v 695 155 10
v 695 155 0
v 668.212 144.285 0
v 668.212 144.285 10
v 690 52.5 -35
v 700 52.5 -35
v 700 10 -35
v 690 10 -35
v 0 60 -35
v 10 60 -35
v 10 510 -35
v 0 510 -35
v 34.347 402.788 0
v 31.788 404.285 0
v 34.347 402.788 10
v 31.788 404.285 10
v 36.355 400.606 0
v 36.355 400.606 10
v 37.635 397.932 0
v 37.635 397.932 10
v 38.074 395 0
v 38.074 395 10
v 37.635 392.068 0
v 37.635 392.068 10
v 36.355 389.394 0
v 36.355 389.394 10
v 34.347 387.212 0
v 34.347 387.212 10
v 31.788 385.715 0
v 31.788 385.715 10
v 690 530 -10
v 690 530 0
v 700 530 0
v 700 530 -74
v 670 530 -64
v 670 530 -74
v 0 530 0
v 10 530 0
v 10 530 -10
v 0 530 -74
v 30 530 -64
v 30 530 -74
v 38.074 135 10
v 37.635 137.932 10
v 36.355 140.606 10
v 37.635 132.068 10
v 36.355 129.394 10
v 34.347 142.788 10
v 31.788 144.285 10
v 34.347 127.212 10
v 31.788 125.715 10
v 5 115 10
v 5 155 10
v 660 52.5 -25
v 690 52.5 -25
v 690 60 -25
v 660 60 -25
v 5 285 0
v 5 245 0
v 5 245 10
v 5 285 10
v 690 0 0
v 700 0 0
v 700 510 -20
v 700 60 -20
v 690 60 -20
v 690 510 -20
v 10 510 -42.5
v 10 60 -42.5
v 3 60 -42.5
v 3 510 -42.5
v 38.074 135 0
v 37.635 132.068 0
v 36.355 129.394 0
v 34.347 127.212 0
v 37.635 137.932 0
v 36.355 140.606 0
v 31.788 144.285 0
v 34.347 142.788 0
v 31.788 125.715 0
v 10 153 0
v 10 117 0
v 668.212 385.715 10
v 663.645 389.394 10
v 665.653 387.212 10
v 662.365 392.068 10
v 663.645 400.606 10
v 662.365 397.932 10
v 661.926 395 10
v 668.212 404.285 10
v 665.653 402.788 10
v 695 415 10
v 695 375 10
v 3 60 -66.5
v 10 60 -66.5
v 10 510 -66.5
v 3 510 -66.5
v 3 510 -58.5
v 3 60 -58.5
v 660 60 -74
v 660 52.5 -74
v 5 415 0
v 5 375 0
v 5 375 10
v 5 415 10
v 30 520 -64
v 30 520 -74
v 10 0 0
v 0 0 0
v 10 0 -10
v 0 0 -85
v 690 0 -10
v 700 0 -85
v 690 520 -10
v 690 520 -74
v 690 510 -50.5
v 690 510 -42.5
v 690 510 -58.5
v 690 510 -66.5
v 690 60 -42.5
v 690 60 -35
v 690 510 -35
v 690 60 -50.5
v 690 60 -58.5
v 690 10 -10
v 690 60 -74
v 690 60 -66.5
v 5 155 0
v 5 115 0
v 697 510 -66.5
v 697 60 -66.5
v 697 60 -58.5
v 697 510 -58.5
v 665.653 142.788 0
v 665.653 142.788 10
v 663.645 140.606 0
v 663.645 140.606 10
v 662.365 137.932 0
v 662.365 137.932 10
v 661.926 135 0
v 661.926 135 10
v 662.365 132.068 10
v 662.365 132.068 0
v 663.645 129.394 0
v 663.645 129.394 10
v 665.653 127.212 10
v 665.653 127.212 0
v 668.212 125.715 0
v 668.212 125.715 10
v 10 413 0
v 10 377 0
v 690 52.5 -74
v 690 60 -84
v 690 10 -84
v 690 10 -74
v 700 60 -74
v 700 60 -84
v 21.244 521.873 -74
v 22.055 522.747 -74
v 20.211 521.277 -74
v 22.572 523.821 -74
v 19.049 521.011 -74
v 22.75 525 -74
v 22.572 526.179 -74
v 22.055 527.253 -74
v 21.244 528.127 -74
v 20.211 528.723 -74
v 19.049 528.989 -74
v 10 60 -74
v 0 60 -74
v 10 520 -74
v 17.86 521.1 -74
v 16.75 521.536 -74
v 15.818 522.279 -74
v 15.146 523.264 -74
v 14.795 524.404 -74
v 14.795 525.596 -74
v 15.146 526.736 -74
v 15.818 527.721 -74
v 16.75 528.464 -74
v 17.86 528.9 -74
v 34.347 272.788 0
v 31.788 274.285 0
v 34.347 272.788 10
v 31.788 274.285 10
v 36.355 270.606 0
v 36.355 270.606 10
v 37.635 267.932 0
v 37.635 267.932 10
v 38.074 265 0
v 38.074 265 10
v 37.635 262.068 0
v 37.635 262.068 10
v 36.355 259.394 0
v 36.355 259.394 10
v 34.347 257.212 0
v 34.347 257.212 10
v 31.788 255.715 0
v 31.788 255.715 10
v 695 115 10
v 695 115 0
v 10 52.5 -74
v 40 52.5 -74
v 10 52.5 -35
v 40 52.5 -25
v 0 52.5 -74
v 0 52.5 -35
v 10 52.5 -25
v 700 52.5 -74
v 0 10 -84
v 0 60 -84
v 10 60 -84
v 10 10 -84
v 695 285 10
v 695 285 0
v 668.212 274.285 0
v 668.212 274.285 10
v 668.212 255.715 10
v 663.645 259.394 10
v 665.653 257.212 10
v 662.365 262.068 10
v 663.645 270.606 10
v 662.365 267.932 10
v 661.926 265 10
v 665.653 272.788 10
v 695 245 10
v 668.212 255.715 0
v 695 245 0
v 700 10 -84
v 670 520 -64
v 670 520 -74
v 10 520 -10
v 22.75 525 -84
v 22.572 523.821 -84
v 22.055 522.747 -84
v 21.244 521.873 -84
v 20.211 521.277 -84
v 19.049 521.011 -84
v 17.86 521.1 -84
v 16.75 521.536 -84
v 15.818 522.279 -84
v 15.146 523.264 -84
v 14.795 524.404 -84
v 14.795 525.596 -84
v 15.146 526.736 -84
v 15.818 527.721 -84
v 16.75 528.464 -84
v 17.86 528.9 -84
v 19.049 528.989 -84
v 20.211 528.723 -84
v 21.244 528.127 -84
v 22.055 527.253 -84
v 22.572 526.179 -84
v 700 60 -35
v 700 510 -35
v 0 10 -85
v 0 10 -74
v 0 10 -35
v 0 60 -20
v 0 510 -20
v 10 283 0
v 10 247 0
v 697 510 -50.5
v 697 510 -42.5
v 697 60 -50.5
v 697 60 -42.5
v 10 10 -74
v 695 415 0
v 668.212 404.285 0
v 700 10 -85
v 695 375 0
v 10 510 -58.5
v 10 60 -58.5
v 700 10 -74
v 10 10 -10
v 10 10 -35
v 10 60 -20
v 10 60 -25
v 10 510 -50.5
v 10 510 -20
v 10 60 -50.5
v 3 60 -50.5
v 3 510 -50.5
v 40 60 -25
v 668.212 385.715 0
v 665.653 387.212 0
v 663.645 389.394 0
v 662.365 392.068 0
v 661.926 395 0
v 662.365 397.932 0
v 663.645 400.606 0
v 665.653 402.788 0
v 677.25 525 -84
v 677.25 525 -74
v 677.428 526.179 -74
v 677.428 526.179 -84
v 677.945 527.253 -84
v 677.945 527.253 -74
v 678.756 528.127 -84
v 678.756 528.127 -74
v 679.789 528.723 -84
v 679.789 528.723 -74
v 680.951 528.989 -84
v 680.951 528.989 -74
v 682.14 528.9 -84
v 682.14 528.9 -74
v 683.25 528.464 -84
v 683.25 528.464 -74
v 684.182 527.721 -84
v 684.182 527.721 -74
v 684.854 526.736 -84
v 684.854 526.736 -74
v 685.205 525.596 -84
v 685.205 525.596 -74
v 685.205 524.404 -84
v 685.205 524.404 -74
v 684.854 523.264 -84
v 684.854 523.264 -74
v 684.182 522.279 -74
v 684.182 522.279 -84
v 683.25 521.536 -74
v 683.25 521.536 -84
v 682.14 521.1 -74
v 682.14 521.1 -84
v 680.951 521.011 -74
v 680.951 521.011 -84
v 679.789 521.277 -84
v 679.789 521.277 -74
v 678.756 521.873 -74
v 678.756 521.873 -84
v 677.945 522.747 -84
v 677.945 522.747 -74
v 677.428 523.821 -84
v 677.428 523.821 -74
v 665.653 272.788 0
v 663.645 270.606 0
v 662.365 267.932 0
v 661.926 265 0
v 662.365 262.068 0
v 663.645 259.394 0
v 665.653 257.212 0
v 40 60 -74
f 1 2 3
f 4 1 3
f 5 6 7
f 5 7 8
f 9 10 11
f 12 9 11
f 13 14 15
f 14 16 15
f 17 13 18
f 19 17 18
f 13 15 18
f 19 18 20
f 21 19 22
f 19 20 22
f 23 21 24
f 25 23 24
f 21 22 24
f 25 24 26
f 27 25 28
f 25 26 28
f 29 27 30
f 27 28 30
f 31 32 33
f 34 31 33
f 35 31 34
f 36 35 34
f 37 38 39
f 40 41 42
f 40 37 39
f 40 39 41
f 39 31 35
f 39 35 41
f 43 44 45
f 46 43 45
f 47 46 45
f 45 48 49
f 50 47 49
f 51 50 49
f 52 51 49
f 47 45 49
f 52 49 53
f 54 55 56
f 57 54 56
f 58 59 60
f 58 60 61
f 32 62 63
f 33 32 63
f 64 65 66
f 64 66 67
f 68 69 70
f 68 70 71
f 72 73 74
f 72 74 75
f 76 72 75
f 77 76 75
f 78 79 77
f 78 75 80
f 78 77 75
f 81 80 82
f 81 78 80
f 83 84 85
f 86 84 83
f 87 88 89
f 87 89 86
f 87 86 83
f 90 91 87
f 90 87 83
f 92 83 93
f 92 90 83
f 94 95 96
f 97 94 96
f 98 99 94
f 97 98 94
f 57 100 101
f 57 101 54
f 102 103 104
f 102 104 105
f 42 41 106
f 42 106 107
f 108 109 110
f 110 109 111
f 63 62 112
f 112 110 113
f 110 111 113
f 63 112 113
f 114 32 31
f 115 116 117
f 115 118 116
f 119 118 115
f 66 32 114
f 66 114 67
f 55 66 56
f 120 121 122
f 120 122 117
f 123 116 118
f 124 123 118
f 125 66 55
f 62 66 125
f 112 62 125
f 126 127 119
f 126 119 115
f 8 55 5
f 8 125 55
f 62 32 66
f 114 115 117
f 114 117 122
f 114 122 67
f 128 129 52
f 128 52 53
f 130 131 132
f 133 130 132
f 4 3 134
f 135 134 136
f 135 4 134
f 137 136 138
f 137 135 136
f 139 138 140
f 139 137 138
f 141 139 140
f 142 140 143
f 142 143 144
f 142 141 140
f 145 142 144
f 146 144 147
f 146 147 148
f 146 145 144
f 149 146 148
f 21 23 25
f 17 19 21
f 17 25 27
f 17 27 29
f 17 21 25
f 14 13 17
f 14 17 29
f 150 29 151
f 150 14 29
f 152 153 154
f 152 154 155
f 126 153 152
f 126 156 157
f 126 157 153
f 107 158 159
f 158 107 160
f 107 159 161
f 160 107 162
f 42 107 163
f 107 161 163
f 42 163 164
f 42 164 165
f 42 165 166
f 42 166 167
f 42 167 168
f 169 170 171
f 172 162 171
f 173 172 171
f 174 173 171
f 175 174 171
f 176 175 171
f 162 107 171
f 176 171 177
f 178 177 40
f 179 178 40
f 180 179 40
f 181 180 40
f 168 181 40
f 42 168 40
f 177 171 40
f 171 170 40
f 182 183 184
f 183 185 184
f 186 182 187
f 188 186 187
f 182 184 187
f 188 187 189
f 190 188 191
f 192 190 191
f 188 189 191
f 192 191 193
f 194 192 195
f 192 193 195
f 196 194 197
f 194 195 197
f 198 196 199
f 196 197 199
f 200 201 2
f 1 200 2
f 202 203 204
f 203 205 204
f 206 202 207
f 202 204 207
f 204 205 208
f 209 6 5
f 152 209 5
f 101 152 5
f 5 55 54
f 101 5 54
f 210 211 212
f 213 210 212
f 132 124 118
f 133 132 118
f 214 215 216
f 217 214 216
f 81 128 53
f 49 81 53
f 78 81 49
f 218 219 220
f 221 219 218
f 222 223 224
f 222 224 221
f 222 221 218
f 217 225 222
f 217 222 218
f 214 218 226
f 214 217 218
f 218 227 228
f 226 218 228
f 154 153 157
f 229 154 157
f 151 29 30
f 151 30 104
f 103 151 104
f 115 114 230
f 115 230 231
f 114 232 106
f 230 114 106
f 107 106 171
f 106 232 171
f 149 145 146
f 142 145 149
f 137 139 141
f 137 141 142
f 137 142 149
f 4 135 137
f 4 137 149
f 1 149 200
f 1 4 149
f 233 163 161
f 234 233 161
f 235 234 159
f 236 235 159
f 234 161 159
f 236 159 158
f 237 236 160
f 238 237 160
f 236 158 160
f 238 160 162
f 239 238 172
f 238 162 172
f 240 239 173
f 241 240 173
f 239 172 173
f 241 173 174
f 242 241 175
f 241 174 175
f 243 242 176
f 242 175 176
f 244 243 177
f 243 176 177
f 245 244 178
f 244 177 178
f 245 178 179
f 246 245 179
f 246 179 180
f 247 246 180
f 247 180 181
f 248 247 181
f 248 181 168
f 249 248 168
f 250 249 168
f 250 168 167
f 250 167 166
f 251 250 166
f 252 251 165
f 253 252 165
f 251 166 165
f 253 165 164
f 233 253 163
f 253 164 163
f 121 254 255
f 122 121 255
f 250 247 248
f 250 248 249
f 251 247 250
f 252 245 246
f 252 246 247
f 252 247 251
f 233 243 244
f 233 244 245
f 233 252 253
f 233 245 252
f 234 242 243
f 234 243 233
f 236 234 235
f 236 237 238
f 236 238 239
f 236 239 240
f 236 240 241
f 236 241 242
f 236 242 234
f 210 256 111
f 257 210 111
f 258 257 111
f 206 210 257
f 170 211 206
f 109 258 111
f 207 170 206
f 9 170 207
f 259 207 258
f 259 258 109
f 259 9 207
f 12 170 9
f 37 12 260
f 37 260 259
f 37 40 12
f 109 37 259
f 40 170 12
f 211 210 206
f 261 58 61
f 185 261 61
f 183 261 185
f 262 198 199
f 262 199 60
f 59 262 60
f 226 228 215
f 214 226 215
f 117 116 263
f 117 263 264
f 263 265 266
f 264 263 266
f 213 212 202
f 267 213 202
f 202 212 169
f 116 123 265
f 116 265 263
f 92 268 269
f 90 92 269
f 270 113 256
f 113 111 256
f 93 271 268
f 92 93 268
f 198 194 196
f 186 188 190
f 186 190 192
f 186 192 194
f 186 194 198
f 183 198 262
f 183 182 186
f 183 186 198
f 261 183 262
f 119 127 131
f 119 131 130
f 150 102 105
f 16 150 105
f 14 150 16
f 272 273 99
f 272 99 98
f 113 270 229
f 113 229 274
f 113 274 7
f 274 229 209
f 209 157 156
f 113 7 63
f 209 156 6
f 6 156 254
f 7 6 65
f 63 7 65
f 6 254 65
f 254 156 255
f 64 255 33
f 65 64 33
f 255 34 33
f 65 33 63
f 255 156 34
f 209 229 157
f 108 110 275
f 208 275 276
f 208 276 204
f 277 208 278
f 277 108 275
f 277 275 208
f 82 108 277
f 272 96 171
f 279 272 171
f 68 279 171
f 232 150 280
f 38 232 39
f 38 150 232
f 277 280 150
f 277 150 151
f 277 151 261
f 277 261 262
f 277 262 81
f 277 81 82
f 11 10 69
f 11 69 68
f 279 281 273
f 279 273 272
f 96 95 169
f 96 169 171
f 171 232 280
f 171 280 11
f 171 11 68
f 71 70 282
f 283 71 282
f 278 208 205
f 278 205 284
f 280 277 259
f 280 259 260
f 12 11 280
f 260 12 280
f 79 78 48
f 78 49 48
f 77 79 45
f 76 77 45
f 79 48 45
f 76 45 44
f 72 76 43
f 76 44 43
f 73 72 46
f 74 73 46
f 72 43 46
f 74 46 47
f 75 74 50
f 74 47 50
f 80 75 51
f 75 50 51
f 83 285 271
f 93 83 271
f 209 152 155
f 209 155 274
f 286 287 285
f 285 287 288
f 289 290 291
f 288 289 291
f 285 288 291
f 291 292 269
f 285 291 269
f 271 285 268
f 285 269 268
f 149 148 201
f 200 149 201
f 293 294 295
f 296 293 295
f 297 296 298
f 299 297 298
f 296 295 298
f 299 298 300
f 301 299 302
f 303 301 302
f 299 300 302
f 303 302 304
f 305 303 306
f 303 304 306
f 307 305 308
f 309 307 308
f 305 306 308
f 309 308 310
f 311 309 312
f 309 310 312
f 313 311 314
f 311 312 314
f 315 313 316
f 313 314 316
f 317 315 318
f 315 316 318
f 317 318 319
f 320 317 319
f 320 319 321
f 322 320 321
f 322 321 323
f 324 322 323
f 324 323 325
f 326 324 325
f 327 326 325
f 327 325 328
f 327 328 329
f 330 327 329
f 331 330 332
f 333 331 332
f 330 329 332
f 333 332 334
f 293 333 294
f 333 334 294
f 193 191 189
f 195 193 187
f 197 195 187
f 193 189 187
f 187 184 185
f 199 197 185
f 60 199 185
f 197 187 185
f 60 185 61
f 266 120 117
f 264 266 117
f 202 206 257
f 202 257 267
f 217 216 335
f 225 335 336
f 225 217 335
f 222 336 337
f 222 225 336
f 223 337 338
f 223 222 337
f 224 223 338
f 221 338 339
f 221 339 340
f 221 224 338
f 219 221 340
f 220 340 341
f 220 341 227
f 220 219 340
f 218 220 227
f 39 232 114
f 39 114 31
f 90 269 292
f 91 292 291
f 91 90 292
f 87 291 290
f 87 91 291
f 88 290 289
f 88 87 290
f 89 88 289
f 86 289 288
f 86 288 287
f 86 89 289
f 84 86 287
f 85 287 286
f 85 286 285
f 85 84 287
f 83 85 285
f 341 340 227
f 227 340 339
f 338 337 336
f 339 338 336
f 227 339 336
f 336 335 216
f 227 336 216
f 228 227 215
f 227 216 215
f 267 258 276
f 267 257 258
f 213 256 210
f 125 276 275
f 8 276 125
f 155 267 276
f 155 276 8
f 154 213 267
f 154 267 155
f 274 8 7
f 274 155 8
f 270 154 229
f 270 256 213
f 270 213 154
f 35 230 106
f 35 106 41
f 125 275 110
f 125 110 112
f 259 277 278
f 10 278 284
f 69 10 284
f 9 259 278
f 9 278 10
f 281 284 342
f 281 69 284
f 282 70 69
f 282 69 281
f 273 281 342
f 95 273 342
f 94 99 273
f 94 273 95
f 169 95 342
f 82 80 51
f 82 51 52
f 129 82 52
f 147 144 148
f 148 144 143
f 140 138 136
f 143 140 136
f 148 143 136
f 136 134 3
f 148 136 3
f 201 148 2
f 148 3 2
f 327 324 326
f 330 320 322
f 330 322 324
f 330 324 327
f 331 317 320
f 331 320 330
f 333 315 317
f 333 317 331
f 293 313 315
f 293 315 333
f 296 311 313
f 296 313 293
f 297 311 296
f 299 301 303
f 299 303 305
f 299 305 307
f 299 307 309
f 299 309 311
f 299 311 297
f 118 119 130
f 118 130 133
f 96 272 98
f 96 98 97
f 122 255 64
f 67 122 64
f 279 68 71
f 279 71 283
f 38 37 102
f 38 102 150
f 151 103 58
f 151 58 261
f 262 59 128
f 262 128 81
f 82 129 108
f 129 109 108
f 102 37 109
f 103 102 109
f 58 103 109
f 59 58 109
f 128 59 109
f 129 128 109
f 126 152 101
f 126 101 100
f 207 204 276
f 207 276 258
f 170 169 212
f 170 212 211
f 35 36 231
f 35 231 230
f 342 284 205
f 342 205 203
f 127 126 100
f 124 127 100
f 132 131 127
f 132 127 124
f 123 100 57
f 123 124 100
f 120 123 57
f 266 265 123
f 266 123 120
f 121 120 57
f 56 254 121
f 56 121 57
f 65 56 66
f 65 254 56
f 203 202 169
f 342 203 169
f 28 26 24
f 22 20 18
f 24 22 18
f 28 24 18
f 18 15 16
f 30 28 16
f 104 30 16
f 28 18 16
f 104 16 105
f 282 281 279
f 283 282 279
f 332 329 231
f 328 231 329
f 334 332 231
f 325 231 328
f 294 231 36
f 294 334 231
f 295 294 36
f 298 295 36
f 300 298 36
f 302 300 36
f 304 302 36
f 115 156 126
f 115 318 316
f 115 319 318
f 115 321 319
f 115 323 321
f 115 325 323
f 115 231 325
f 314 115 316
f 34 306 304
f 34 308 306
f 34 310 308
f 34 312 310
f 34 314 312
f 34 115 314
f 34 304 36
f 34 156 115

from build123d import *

# Parameters (mm, degrees)
ESQUISSE1_W                  = 10
ESQUISSE1_H                  = 25
BOSS_EXTRU_1_DEPTH           = 530
BOSS_EXTRU_1_2_DEPTH         = 530
BOSS_EXTRU_4_DEPTH           = 10
ESQUISSE8_W                  = 10
ESQUISSE8_H                  = 10
BOSS_EXTRU_5_DEPTH           = 60
ESQUISSE9_W                  = 60
ESQUISSE9_H                  = 10
BOSS_EXTRU_6_DEPTH           = 690
CONG_1_R                     = 10
CONG_2_R                     = 10
CONG_3_R                     = 10
CONG_4_R                     = 10
ESQUISSE10_W                 = 680
ESQUISSE10_H                 = 10
BOSS_EXTRU_7_DEPTH           = 15
ESQUISSE11_W                 = 10
ESQUISSE11_H                 = 50
BOSS_EXTRU_8_DEPTH           = 10
ESQUISSE12_W                 = 10
ESQUISSE12_H                 = 7.5
BOSS_EXTRU_9_DEPTH           = 39
ESQUISSE13_W                 = 49
ESQUISSE13_H                 = 7.5
BOSS_EXTRU_10_DEPTH          = 30
ESQUISSE19_W                 = 49
ESQUISSE19_H                 = 7.5
BOSS_EXTRU_14_DEPTH          = 30
ESQUISSE14_W                 = 10
ESQUISSE14_H                 = 49
BOSS_EXTRU_11_DEPTH          = 470
ESQUISSE16_W                 = 10
ESQUISSE16_H                 = 10
BOSS_EXTRU_12_DEPTH          = 20
ESQUISSE20_W                 = 10
ESQUISSE20_H                 = 10
BOSS_EXTRU_15_DEPTH          = 20
ESQUISSE17_R                 = 4
BOSS_EXTRU_13_DEPTH          = 10
BOSS_EXTRU_16_REACH          = 876.2
ESQUISSE21_W                 = 54
ESQUISSE21_H                 = 10
ENL_V_MAT_EXTRU_1_DEPTH      = 875.199633951
ENL_V_MAT_EXTRU_1_DEPTH_BACK = 875.199633951
ESQUISSE22_W                 = 15
ESQUISSE22_H                 = 450
ESQUISSE23_W                 = 10
ESQUISSE23_H                 = 7.5
BOSS_EXTRU_17_DEPTH          = 10
BOSS_EXTRU_18_REACH          = 853.605
ESQUISSE24_W                 = 10
ESQUISSE24_H                 = 10
ESQUISSE25_W                 = 10
ESQUISSE25_H                 = 7.5
BOSS_EXTRU_19_DEPTH          = 10
BOSS_EXTRU_20_REACH          = 853.605
ESQUISSE26_W                 = 10
ESQUISSE26_H                 = 10
ESQUISSE28_W                 = 8
ESQUISSE28_H                 = 450
ENL_V_MAT_EXTRU_2_DEPTH      = 7
ESQUISSE29_W                 = 8
ESQUISSE29_H                 = 450
ENL_V_MAT_EXTRU_3_DEPTH      = 7


with BuildPart() as part:
    # Esquisse1 → Boss.-Extru.1 (new body)
    with BuildSketch(Plane(origin=(0, 0, 0), x_dir=(1, 0, 0), z_dir=(0, 1, 0))):
        with Locations((5, 12.5)):
            Rectangle(ESQUISSE1_W, ESQUISSE1_H)
    extrude(amount=BOSS_EXTRU_1_DEPTH)

    # Esquisse7 → Boss.-Extru.4 (add)
    with BuildSketch(Plane.XY):
        Polygon((5, 415), (55, 395), (5, 375), align=None)
        Polygon((5, 285), (55, 265), (5, 245), align=None)
        Polygon((5, 155), (55, 135), (5, 115), align=None)
        Polygon((695, 115), (695, 155), (645, 135), align=None)
        Polygon((695, 245), (695, 285), (645, 265), align=None)
        Polygon((695, 375), (695, 415), (645, 395), align=None)
    extrude(amount=BOSS_EXTRU_4_DEPTH)


with BuildPart() as body_2:
    # Esquisse1 → Boss.-Extru.1 2 (new body)
    with BuildSketch(Plane(origin=(0, 0, 0), x_dir=(1, 0, 0), z_dir=(0, 1, 0))):
        with Locations((695, 12.5)):
            Rectangle(ESQUISSE1_W, ESQUISSE1_H)
    extrude(amount=BOSS_EXTRU_1_2_DEPTH)



with BuildPart() as boss_extru_4_piece_1:
    # of the separate pieces the step leaves, piece 1, a body of its own (boss_extru_4_pieces)
    add(part.part.solids().sort_by_distance((0, 0, 0))[0])

    # Esquisse8 → Boss.-Extru.5 (add)
    with BuildSketch(Plane(origin=(0, 0, -25), x_dir=(-1, 0, 0), z_dir=(0, 0, -1))):
        with Locations((-5, 5)):
            Rectangle(ESQUISSE8_W, ESQUISSE8_H)
    extrude(amount=BOSS_EXTRU_5_DEPTH)


with BuildPart() as boss_extru_4_piece_2:
    # of the separate pieces the step leaves, piece 2, a body of its own (boss_extru_4_pieces)
    add(part.part.solids().sort_by_distance((695, 115, 0))[0])

    # Congé4
    cong_4_edges = [boss_extru_4_piece_2.edges().sort_by_distance(p)[0] for p in [
        (645, 135, 5),
    ]]
    fillet(cong_4_edges, radius=CONG_4_R)


with BuildPart() as boss_extru_4_piece_3:
    # of the separate pieces the step leaves, piece 3, a body of its own (boss_extru_4_pieces)
    add(part.part.solids().sort_by_distance((695, 245, 0))[0])

    # Congé3
    cong_3_edges = [boss_extru_4_piece_3.edges().sort_by_distance(p)[0] for p in [
        (645, 265, 5),
    ]]
    fillet(cong_3_edges, radius=CONG_3_R)


with BuildPart() as boss_extru_4_piece_4:
    # of the separate pieces the step leaves, piece 4, a body of its own (boss_extru_4_pieces)
    add(part.part.solids().sort_by_distance((695, 375, 0))[0])

    # Congé2
    cong_2_edges = [boss_extru_4_piece_4.edges().sort_by_distance(p)[0] for p in [
        (645, 395, 5),
    ]]
    fillet(cong_2_edges, radius=CONG_2_R)


with BuildPart() as body_2_1:
    add(body_2.part)

    add(boss_extru_4_piece_1.part)  # Boss.-Extru.6 merges Boss.-Extru.4 piece 1
    # Esquisse9 → Boss.-Extru.6 (add)
    with BuildSketch(Plane(origin=(10, 0, 0), x_dir=(0, 0, -1), z_dir=(1, 0, 0))):
        with Locations((55, 5)):
            Rectangle(ESQUISSE9_W, ESQUISSE9_H)
    extrude(amount=BOSS_EXTRU_6_DEPTH)

    # Congé1
    cong_1_edges = [body_2_1.edges().sort_by_distance(p)[0] for p in [
        (55, 395, 5),
        (55, 265, 5),
        (55, 135, 5),
    ]]
    fillet(cong_1_edges, radius=CONG_1_R)

    # Esquisse10 → Boss.-Extru.7 (add)
    with BuildSketch(Plane.XY.offset(-25)):
        with Locations((350, 5)):
            Rectangle(ESQUISSE10_W, ESQUISSE10_H)
    extrude(amount=BOSS_EXTRU_7_DEPTH)

    # Esquisse11 → Boss.-Extru.8 (add)
    with BuildSketch(Plane(origin=(0, 0, -25), x_dir=(-1, 0, 0), z_dir=(0, 0, -1))):
        with Locations((-695, 35)):
            Rectangle(ESQUISSE11_W, ESQUISSE11_H)
        with Locations((-5, 35)):
            Rectangle(ESQUISSE11_W, ESQUISSE11_H)
    extrude(amount=BOSS_EXTRU_8_DEPTH)

    # Esquisse12 → Boss.-Extru.9 (add)
    with BuildSketch(Plane(origin=(0, 0, -35), x_dir=(-1, 0, 0), z_dir=(0, 0, -1))):
        with Locations((-695, 56.25)):
            Rectangle(ESQUISSE12_W, ESQUISSE12_H)
        with Locations((-5, 56.25)):
            Rectangle(ESQUISSE12_W, ESQUISSE12_H)
    extrude(amount=BOSS_EXTRU_9_DEPTH)

    # Esquisse13 → Boss.-Extru.10 (add)
    with BuildSketch(Plane.ZY.offset(-690)):
        with Locations((-49.5, 56.25)):
            Rectangle(ESQUISSE13_W, ESQUISSE13_H)
    extrude(amount=BOSS_EXTRU_10_DEPTH)

    # Esquisse19 → Boss.-Extru.14 (add)
    with BuildSketch(Plane(origin=(10, 0, 0), x_dir=(0, 0, -1), z_dir=(1, 0, 0))):
        with Locations((49.5, 56.25)):
            Rectangle(ESQUISSE19_W, ESQUISSE19_H)
    extrude(amount=BOSS_EXTRU_14_DEPTH)

    # Esquisse14 → Boss.-Extru.11 (add)
    with BuildSketch(Plane(origin=(0, 60, 0), x_dir=(1, 0, 0), z_dir=(0, 1, 0))):
        with Locations((695, 49.5)):
            Rectangle(ESQUISSE14_W, ESQUISSE14_H)
        with Locations((5, 49.5)):
            Rectangle(ESQUISSE14_W, ESQUISSE14_H)
    extrude(amount=BOSS_EXTRU_11_DEPTH)

    # Esquisse16 → Boss.-Extru.12 (add)
    with BuildSketch(Plane.ZY.offset(-690)):
        with Locations((-69, 525)):
            Rectangle(ESQUISSE16_W, ESQUISSE16_H)
    extrude(amount=BOSS_EXTRU_12_DEPTH)

    # Esquisse20 → Boss.-Extru.15 (add)
    with BuildSketch(Plane(origin=(10, 0, 0), x_dir=(0, 0, -1), z_dir=(1, 0, 0))):
        with Locations((69, 525)):
            Rectangle(ESQUISSE20_W, ESQUISSE20_H)
    extrude(amount=BOSS_EXTRU_15_DEPTH)

    # Esquisse17 → Boss.-Extru.13 (add)
    with BuildSketch(Plane(origin=(0, 0, -74), x_dir=(-1, 0, 0), z_dir=(0, 0, -1))):
        with Locations((-681.25, 525)):
            Circle(ESQUISSE17_R)
        with Locations(Location((-18.75, 525, 0), (0, 0, 180))):
            Circle(ESQUISSE17_R)
    extrude(amount=BOSS_EXTRU_13_DEPTH)

    # Esquisse21 → Boss.-Extru.16 (add, up to next)
    with BuildSketch(Plane(origin=(10, 0, 0), x_dir=(0, 0, -1), z_dir=(1, 0, 0)), mode=Mode.PRIVATE) as boss_extru_16_sk1:
        with Locations((37, 525)):
            Rectangle(ESQUISSE21_W, ESQUISSE21_H)
    boss_extru_16_tool1 = extrude(boss_extru_16_sk1.sketch, amount=BOSS_EXTRU_16_REACH, mode=Mode.PRIVATE) - body_2_1.part
    add(boss_extru_16_tool1.solids().sort_by_distance((10, 525, -37))[0])

    # Esquisse22 → Enlèv. mat.-Extru.1 (cut, two sides: drawn at the far end of the back side and taken through both)
    with BuildSketch(Plane.ZY.offset(-690).offset(-ENL_V_MAT_EXTRU_1_DEPTH_BACK)):
        with Locations((-27.5, 285)):
            Rectangle(ESQUISSE22_W, ESQUISSE22_H)
    extrude(amount=ENL_V_MAT_EXTRU_1_DEPTH + ENL_V_MAT_EXTRU_1_DEPTH_BACK, mode=Mode.SUBTRACT)

    # Esquisse23 → Boss.-Extru.17 (add)
    with BuildSketch(Plane(origin=(0, 0, -74), x_dir=(-1, 0, 0), z_dir=(0, 0, -1))):
        with Locations((-695, 56.25)):
            Rectangle(ESQUISSE23_W, ESQUISSE23_H)
    extrude(amount=BOSS_EXTRU_17_DEPTH)

    # Esquisse24 → Boss.-Extru.18 (add, up to next)
    with BuildSketch(Plane.XZ.offset(-52.5), mode=Mode.PRIVATE) as boss_extru_18_sk1:
        with Locations((695, -79)):
            Rectangle(ESQUISSE24_W, ESQUISSE24_H)
    boss_extru_18_tool1 = extrude(boss_extru_18_sk1.sketch, amount=BOSS_EXTRU_18_REACH, mode=Mode.PRIVATE) - body_2_1.part
    add(boss_extru_18_tool1.solids().sort_by_distance((695, 52.5, -79))[0])

    # Esquisse25 → Boss.-Extru.19 (add)
    with BuildSketch(Plane(origin=(0, 0, -74), x_dir=(-1, 0, 0), z_dir=(0, 0, -1))):
        with Locations((-5, 56.25)):
            Rectangle(ESQUISSE25_W, ESQUISSE25_H)
    extrude(amount=BOSS_EXTRU_19_DEPTH)

    # Esquisse26 → Boss.-Extru.20 (add, up to next)
    with BuildSketch(Plane.XZ.offset(-52.5), mode=Mode.PRIVATE) as boss_extru_20_sk1:
        with Locations((5, -79)):
            Rectangle(ESQUISSE26_W, ESQUISSE26_H)
    boss_extru_20_tool1 = extrude(boss_extru_20_sk1.sketch, amount=BOSS_EXTRU_20_REACH, mode=Mode.PRIVATE) - body_2_1.part
    add(boss_extru_20_tool1.solids().sort_by_distance((5, 52.5, -79))[0])

    # Esquisse28 → Enlèv. mat.-Extru.2 (cut)
    with BuildSketch(Plane.ZY.offset(-690)):
        with Locations((-62.5, 285)):
            Rectangle(ESQUISSE28_W, ESQUISSE28_H)
        with Locations((-46.5, 285)):
            Rectangle(ESQUISSE28_W, ESQUISSE28_H)
    extrude(amount=-ENL_V_MAT_EXTRU_2_DEPTH, mode=Mode.SUBTRACT)

    # Esquisse29 → Enlèv. mat.-Extru.3 (cut)
    with BuildSketch(Plane(origin=(10, 0, 0), x_dir=(0, 0, -1), z_dir=(1, 0, 0))):
        with Locations((46.5, 285)):
            Rectangle(ESQUISSE29_W, ESQUISSE29_H)
        with Locations((62.5, 285)):
            Rectangle(ESQUISSE29_W, ESQUISSE29_H)
    extrude(amount=-ENL_V_MAT_EXTRU_3_DEPTH, mode=Mode.SUBTRACT)


solid = Compound([boss_extru_4_piece_2.part, boss_extru_4_piece_3.part, boss_extru_4_piece_4.part, body_2_1.part])
